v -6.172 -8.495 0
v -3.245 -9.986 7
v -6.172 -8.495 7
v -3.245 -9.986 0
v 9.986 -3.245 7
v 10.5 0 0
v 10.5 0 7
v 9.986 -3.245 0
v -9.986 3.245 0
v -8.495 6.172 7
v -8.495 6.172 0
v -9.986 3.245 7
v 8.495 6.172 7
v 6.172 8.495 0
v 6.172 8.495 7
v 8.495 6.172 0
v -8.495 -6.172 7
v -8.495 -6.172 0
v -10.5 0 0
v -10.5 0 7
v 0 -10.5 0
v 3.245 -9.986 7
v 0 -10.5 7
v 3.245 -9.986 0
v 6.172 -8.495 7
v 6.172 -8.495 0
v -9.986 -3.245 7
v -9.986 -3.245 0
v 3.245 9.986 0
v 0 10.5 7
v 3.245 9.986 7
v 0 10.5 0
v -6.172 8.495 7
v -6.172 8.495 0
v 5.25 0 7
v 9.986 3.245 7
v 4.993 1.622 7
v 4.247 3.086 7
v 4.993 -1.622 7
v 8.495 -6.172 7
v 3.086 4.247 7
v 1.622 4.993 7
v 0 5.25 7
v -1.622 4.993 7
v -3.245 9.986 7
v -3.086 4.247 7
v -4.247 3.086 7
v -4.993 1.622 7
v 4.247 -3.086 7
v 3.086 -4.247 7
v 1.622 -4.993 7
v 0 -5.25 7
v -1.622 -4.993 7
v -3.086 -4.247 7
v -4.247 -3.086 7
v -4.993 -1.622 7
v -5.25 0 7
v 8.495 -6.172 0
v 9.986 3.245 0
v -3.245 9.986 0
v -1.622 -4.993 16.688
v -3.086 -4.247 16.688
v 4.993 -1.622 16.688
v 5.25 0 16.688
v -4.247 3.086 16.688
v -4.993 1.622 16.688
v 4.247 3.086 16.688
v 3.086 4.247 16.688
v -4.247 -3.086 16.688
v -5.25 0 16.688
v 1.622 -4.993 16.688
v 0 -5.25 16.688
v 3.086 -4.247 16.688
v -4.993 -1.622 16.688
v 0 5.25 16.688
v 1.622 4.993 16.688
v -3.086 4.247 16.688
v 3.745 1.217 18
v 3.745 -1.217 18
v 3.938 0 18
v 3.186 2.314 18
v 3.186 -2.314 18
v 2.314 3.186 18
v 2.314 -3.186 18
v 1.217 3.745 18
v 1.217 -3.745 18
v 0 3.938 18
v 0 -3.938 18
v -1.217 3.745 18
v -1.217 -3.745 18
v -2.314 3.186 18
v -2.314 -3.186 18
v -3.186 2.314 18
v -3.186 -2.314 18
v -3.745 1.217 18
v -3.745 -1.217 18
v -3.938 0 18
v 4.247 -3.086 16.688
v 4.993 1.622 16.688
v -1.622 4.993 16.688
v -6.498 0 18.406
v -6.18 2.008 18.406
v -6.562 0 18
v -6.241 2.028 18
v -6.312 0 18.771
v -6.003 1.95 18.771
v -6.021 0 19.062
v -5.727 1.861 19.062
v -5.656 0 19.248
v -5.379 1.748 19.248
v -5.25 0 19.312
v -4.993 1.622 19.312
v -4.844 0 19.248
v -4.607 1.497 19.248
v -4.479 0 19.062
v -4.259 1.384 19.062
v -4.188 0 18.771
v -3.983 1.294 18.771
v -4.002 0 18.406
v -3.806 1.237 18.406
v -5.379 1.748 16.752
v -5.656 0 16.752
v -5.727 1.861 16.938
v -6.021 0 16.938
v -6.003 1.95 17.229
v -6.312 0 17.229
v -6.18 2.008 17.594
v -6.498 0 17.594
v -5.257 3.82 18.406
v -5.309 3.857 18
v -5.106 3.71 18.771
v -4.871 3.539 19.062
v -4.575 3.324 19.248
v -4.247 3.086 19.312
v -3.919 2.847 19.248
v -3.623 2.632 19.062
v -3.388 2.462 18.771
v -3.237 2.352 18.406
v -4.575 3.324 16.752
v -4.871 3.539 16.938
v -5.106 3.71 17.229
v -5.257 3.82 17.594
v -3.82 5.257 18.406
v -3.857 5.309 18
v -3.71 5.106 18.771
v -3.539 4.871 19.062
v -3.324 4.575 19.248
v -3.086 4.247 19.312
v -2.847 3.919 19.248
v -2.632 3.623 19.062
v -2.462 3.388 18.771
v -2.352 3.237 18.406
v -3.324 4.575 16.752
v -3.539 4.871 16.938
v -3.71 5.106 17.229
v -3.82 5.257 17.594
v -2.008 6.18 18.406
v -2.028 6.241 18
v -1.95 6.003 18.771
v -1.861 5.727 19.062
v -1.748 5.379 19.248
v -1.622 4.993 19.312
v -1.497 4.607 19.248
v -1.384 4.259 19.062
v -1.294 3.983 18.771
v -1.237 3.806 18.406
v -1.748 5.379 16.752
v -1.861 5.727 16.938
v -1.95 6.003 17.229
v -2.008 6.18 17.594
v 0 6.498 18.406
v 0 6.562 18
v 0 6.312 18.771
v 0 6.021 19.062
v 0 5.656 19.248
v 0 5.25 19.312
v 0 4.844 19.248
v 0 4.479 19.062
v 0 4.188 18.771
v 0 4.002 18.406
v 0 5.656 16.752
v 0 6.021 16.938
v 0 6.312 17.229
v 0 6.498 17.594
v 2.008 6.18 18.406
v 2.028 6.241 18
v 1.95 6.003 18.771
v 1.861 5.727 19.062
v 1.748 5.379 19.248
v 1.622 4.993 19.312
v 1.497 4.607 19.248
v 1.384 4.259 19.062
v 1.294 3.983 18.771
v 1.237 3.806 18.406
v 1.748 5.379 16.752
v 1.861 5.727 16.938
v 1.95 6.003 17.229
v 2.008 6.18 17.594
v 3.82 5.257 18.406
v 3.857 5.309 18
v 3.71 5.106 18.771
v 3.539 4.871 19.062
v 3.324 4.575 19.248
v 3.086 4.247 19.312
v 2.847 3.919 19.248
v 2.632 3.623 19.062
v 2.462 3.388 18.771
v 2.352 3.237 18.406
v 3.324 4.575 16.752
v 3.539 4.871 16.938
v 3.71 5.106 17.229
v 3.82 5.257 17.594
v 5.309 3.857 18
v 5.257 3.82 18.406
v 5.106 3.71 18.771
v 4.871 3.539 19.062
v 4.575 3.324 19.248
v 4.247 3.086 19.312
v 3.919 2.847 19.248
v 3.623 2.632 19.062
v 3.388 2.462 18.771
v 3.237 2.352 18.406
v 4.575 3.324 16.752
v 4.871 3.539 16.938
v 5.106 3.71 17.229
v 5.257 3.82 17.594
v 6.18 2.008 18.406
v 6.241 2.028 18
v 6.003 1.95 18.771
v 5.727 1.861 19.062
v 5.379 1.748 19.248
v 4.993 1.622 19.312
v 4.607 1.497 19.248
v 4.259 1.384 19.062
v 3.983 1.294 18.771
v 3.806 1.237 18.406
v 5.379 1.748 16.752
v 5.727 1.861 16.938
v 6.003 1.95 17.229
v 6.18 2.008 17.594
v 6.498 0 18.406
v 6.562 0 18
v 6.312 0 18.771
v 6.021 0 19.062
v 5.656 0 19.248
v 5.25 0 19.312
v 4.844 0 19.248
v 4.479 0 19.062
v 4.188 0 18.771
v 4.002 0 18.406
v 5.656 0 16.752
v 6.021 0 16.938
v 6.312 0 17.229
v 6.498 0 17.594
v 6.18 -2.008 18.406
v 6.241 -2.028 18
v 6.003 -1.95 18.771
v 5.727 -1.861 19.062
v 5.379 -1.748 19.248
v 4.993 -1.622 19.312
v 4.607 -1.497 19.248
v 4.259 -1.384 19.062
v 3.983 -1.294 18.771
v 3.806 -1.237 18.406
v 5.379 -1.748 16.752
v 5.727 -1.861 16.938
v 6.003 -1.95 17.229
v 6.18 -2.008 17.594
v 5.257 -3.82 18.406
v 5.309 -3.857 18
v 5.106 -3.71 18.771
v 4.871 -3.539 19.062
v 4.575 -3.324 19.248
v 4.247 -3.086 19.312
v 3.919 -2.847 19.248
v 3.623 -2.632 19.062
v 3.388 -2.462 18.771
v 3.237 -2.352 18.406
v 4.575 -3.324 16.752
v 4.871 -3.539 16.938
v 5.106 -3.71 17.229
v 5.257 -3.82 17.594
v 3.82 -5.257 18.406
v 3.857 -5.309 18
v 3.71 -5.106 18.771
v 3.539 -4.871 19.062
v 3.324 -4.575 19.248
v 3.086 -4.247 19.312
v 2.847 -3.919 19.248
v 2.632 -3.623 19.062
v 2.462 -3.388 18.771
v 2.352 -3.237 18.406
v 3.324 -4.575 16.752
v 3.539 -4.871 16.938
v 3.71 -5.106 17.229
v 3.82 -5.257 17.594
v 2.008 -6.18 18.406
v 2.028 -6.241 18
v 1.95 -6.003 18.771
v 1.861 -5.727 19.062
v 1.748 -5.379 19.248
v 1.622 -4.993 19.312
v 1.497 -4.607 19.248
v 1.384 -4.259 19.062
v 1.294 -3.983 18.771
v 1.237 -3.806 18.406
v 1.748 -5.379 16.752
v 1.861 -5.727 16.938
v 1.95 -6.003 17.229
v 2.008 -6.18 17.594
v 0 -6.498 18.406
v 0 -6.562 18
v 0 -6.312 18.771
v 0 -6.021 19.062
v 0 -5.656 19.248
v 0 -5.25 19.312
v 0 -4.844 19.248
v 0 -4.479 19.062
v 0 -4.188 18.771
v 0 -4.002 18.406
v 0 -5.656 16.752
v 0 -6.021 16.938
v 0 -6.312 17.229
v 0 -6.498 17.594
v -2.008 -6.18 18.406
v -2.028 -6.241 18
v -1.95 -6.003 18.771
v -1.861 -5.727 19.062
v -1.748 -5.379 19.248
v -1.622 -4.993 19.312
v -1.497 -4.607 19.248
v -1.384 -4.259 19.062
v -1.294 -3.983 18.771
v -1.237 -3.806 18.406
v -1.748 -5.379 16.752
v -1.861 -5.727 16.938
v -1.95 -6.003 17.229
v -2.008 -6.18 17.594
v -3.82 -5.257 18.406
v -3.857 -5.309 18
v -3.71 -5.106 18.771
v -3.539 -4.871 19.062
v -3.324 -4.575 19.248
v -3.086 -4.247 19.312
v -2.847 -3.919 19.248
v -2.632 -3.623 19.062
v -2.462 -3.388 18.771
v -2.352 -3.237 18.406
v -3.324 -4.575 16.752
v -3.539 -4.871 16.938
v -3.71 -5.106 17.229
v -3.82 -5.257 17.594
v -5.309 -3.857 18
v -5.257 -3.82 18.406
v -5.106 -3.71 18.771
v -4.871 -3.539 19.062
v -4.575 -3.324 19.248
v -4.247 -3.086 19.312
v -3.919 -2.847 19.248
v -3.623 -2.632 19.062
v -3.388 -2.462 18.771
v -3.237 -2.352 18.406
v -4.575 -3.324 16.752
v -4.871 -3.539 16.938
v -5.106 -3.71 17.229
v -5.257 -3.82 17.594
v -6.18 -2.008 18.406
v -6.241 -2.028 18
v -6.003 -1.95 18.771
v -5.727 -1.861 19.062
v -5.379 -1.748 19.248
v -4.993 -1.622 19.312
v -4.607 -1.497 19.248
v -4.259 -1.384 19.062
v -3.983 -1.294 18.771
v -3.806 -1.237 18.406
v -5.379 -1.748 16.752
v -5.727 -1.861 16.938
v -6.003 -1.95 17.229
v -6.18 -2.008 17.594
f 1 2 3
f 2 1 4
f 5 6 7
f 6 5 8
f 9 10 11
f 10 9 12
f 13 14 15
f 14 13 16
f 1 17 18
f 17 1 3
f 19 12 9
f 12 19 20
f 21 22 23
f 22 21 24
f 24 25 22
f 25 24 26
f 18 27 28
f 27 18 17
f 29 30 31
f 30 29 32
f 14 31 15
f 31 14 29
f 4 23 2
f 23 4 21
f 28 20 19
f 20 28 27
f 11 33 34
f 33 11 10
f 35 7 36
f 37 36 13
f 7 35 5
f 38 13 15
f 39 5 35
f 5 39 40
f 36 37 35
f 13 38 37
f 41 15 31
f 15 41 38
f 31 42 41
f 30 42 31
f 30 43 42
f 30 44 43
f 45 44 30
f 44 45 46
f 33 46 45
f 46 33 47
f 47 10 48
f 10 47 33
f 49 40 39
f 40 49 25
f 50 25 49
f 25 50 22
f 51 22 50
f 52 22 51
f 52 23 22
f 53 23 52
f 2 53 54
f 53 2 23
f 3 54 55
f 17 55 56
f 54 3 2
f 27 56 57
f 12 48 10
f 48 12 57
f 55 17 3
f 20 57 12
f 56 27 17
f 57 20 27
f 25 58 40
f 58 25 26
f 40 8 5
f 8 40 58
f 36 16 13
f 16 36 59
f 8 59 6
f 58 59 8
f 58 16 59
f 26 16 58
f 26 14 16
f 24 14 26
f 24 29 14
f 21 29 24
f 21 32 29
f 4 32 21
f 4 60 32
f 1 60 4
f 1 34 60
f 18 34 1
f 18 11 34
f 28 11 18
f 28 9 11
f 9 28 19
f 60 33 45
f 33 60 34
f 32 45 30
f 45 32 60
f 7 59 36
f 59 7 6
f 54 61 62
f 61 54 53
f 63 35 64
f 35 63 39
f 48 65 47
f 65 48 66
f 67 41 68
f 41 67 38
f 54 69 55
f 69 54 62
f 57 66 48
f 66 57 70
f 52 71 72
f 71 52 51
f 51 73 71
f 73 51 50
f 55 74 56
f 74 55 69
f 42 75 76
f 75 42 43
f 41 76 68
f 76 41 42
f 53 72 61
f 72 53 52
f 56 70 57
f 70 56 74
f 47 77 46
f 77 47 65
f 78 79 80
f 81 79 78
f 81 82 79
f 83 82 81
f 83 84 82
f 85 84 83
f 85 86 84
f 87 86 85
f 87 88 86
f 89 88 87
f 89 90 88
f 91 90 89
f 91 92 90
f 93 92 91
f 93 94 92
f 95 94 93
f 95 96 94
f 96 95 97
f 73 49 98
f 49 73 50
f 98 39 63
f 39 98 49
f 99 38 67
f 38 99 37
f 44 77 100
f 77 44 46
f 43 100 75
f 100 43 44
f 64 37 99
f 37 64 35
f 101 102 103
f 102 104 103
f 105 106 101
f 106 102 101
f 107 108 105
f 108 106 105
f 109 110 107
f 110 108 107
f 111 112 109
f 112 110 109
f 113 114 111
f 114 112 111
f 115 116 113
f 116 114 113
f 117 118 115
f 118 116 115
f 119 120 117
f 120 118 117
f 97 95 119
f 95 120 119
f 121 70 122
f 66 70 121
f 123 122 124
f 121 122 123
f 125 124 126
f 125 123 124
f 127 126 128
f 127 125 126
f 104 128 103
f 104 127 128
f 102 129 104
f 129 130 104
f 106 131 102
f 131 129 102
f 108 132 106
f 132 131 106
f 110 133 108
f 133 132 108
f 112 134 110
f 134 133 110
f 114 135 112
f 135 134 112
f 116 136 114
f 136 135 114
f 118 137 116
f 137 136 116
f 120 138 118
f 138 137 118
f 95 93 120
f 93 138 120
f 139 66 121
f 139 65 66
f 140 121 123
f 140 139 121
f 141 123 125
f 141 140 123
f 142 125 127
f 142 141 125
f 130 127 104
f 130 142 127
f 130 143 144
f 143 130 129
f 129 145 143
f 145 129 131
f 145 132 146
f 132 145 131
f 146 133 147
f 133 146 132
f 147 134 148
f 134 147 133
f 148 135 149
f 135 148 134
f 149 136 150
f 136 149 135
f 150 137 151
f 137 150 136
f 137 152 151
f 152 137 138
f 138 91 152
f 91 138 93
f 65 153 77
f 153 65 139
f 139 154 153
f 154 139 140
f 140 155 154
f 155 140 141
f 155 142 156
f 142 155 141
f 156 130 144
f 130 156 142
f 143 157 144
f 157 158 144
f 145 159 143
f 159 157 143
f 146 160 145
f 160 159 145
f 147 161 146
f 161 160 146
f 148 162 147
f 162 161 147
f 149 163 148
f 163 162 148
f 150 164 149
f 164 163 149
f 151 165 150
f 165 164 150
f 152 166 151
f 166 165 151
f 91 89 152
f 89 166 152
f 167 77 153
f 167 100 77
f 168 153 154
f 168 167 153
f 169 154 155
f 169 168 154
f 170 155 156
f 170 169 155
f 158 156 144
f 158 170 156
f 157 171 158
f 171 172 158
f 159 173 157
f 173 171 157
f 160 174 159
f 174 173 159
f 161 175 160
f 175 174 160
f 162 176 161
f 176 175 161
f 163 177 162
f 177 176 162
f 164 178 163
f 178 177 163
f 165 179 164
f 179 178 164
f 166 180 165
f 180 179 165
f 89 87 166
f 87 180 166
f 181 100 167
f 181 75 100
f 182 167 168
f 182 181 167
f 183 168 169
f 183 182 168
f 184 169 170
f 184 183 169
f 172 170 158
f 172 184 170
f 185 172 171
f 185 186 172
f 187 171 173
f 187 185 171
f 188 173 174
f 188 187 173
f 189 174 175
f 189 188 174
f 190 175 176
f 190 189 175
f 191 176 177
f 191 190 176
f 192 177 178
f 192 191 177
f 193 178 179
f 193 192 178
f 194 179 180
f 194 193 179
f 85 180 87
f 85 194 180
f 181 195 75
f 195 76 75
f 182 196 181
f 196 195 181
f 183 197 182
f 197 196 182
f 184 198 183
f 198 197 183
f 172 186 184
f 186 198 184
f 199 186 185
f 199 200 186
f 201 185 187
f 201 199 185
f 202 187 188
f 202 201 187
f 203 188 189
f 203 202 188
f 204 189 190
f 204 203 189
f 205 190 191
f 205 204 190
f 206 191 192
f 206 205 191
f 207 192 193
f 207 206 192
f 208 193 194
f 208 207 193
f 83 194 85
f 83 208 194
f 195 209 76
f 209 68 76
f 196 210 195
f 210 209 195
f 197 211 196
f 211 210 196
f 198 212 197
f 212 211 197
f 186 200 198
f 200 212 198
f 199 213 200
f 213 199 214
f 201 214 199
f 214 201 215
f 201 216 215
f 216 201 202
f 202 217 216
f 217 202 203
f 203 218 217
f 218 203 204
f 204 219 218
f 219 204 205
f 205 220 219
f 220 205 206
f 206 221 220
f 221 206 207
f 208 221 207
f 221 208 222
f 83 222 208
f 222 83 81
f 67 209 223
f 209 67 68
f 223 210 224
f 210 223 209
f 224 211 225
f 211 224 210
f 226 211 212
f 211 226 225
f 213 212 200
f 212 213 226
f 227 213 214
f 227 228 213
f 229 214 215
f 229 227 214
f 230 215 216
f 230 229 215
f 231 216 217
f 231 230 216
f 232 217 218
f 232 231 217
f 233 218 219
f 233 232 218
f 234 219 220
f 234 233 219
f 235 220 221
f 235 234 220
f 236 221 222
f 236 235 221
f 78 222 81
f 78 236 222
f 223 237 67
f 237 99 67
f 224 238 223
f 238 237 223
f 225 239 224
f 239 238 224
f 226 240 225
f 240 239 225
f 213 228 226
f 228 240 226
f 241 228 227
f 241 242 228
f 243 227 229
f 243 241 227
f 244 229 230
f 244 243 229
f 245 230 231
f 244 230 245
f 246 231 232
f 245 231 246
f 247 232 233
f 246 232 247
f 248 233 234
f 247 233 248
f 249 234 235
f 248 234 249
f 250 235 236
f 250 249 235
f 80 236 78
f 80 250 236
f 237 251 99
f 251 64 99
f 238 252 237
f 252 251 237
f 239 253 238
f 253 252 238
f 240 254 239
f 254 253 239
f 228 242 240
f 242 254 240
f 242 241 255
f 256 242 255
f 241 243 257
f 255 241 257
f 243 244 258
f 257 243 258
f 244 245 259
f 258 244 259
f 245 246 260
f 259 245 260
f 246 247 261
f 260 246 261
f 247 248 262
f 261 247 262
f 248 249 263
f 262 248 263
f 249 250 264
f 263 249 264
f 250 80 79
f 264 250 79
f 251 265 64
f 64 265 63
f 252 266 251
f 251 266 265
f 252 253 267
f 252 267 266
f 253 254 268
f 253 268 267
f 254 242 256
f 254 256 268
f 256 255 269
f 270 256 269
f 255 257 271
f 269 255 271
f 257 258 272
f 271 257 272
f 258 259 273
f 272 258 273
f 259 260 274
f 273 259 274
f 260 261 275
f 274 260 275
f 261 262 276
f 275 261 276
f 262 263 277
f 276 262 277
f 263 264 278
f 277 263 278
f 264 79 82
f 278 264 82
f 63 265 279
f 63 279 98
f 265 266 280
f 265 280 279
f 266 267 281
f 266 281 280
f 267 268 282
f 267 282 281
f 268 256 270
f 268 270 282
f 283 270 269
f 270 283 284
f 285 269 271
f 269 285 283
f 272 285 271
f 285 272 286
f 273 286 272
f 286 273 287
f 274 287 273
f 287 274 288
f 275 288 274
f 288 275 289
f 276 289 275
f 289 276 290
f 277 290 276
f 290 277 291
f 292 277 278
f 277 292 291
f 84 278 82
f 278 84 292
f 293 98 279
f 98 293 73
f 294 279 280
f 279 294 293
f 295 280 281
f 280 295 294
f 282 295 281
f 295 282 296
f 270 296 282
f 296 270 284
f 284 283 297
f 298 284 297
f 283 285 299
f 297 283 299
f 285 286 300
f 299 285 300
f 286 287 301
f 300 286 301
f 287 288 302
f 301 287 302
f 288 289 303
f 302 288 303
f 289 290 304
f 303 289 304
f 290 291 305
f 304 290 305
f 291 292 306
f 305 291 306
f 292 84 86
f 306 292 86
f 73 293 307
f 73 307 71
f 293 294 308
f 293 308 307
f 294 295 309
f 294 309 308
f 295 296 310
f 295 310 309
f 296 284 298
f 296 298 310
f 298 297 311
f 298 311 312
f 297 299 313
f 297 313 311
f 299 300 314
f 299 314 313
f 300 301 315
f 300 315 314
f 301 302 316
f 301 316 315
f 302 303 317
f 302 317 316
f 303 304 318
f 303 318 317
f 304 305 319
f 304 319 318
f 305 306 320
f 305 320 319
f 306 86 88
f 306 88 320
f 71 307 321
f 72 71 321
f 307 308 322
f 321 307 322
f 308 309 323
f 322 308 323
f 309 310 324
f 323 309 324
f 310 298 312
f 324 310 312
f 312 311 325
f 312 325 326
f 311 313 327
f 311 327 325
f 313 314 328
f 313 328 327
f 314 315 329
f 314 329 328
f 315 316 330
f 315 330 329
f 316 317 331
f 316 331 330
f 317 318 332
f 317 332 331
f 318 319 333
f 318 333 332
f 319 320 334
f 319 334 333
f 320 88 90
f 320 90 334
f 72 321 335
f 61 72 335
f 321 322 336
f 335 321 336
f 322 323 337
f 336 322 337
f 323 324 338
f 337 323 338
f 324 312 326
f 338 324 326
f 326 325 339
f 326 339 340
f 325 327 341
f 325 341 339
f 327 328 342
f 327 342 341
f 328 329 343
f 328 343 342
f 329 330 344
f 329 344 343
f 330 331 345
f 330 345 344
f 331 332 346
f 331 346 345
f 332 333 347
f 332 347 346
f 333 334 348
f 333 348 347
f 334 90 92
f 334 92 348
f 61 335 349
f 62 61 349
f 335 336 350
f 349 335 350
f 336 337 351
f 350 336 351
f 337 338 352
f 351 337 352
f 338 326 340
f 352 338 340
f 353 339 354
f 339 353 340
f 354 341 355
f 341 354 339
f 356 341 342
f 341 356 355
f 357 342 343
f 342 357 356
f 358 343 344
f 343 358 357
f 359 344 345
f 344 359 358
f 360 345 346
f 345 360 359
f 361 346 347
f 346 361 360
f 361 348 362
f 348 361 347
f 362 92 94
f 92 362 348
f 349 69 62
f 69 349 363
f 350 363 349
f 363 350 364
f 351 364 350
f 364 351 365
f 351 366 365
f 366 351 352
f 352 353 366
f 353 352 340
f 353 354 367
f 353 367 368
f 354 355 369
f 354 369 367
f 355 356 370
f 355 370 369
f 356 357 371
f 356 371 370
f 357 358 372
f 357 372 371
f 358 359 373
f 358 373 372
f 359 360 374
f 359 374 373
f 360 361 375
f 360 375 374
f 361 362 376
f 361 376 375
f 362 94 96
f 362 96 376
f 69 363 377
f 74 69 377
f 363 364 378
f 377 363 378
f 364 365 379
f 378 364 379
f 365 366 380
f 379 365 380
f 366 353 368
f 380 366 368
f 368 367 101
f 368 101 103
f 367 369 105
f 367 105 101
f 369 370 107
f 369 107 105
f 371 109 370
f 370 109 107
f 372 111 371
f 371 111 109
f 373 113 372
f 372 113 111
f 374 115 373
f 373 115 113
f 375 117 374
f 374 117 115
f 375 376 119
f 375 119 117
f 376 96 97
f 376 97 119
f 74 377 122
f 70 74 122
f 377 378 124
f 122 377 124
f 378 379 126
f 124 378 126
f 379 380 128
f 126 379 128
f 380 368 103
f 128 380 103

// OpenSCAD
$fn=20;

/* [ Quick Presents ] */
quick_presents = 0; // [0: Custom Parameters, 1: Kong Large Red, 2: Kong XL Red]

/* [ Refined Settings ] */

core_diameter = 10.5; //[::non-negative float]

wall_thickness = 11; //[::non-negative float]

handle_radius = core_diameter; //[::non-negative float]
handle_length = 7; //[::non-negative float]

/*
cylinder(h=15, r=10);
translate([0, 0, 15-0.01]) {
    cylinder(h=11, r=5);

    translate([0, 0, 11-0.01]) {
        cylinder(h=2, r=6);
    }
}
*/
kong_plug();

module kong_plug() {
    /**
        [ PLUG HANDLE ]
        This is the handle that will be used to pull the plug out of the Kong toy.

        @param handle_length the length of the handle
        @param handle_radius the radius of the handle, should be larger than the shaft.
    **/
    color("#BE8381") {
        linear_extrude(handle_length) {
            circle(r=handle_radius);
        }
    }
    /**
        [ PLUG SHAFT ]
        This is the shaft that will be inserted into the Kong toy.
        The shaft needs to be "roughly" the same diameter as the hole at the top of the kong, but slightly larger
        to form a seal.
        The shaft length should match the rubber wall thickness, each kong toy has a different thickness.

        @param wall_thickness the thickness of the rubber wall
        @param core_diameter the diameter of the top hole, slightly stretched.
    **/
    core_radius = core_diameter / 2.0;
    color("#81BE83") {
        translate([0, 0, handle_length]) {
            linear_extrude(wall_thickness) {
                circle(r=core_radius);
            }
        }
    }
    color("#A281BE") {
        translate([0, 0, handle_length + wall_thickness]) {
            rotate_extrude() {
                translate([core_radius, 0, 0]) {
                    circle(r=core_radius/4);
                }
            }
        }

    }

}

// module shaft(handle_height, thickness, radius) {
//     total_height = handle_height + thickness;

//     cylinder(h=total_height, r=radius);

// }
